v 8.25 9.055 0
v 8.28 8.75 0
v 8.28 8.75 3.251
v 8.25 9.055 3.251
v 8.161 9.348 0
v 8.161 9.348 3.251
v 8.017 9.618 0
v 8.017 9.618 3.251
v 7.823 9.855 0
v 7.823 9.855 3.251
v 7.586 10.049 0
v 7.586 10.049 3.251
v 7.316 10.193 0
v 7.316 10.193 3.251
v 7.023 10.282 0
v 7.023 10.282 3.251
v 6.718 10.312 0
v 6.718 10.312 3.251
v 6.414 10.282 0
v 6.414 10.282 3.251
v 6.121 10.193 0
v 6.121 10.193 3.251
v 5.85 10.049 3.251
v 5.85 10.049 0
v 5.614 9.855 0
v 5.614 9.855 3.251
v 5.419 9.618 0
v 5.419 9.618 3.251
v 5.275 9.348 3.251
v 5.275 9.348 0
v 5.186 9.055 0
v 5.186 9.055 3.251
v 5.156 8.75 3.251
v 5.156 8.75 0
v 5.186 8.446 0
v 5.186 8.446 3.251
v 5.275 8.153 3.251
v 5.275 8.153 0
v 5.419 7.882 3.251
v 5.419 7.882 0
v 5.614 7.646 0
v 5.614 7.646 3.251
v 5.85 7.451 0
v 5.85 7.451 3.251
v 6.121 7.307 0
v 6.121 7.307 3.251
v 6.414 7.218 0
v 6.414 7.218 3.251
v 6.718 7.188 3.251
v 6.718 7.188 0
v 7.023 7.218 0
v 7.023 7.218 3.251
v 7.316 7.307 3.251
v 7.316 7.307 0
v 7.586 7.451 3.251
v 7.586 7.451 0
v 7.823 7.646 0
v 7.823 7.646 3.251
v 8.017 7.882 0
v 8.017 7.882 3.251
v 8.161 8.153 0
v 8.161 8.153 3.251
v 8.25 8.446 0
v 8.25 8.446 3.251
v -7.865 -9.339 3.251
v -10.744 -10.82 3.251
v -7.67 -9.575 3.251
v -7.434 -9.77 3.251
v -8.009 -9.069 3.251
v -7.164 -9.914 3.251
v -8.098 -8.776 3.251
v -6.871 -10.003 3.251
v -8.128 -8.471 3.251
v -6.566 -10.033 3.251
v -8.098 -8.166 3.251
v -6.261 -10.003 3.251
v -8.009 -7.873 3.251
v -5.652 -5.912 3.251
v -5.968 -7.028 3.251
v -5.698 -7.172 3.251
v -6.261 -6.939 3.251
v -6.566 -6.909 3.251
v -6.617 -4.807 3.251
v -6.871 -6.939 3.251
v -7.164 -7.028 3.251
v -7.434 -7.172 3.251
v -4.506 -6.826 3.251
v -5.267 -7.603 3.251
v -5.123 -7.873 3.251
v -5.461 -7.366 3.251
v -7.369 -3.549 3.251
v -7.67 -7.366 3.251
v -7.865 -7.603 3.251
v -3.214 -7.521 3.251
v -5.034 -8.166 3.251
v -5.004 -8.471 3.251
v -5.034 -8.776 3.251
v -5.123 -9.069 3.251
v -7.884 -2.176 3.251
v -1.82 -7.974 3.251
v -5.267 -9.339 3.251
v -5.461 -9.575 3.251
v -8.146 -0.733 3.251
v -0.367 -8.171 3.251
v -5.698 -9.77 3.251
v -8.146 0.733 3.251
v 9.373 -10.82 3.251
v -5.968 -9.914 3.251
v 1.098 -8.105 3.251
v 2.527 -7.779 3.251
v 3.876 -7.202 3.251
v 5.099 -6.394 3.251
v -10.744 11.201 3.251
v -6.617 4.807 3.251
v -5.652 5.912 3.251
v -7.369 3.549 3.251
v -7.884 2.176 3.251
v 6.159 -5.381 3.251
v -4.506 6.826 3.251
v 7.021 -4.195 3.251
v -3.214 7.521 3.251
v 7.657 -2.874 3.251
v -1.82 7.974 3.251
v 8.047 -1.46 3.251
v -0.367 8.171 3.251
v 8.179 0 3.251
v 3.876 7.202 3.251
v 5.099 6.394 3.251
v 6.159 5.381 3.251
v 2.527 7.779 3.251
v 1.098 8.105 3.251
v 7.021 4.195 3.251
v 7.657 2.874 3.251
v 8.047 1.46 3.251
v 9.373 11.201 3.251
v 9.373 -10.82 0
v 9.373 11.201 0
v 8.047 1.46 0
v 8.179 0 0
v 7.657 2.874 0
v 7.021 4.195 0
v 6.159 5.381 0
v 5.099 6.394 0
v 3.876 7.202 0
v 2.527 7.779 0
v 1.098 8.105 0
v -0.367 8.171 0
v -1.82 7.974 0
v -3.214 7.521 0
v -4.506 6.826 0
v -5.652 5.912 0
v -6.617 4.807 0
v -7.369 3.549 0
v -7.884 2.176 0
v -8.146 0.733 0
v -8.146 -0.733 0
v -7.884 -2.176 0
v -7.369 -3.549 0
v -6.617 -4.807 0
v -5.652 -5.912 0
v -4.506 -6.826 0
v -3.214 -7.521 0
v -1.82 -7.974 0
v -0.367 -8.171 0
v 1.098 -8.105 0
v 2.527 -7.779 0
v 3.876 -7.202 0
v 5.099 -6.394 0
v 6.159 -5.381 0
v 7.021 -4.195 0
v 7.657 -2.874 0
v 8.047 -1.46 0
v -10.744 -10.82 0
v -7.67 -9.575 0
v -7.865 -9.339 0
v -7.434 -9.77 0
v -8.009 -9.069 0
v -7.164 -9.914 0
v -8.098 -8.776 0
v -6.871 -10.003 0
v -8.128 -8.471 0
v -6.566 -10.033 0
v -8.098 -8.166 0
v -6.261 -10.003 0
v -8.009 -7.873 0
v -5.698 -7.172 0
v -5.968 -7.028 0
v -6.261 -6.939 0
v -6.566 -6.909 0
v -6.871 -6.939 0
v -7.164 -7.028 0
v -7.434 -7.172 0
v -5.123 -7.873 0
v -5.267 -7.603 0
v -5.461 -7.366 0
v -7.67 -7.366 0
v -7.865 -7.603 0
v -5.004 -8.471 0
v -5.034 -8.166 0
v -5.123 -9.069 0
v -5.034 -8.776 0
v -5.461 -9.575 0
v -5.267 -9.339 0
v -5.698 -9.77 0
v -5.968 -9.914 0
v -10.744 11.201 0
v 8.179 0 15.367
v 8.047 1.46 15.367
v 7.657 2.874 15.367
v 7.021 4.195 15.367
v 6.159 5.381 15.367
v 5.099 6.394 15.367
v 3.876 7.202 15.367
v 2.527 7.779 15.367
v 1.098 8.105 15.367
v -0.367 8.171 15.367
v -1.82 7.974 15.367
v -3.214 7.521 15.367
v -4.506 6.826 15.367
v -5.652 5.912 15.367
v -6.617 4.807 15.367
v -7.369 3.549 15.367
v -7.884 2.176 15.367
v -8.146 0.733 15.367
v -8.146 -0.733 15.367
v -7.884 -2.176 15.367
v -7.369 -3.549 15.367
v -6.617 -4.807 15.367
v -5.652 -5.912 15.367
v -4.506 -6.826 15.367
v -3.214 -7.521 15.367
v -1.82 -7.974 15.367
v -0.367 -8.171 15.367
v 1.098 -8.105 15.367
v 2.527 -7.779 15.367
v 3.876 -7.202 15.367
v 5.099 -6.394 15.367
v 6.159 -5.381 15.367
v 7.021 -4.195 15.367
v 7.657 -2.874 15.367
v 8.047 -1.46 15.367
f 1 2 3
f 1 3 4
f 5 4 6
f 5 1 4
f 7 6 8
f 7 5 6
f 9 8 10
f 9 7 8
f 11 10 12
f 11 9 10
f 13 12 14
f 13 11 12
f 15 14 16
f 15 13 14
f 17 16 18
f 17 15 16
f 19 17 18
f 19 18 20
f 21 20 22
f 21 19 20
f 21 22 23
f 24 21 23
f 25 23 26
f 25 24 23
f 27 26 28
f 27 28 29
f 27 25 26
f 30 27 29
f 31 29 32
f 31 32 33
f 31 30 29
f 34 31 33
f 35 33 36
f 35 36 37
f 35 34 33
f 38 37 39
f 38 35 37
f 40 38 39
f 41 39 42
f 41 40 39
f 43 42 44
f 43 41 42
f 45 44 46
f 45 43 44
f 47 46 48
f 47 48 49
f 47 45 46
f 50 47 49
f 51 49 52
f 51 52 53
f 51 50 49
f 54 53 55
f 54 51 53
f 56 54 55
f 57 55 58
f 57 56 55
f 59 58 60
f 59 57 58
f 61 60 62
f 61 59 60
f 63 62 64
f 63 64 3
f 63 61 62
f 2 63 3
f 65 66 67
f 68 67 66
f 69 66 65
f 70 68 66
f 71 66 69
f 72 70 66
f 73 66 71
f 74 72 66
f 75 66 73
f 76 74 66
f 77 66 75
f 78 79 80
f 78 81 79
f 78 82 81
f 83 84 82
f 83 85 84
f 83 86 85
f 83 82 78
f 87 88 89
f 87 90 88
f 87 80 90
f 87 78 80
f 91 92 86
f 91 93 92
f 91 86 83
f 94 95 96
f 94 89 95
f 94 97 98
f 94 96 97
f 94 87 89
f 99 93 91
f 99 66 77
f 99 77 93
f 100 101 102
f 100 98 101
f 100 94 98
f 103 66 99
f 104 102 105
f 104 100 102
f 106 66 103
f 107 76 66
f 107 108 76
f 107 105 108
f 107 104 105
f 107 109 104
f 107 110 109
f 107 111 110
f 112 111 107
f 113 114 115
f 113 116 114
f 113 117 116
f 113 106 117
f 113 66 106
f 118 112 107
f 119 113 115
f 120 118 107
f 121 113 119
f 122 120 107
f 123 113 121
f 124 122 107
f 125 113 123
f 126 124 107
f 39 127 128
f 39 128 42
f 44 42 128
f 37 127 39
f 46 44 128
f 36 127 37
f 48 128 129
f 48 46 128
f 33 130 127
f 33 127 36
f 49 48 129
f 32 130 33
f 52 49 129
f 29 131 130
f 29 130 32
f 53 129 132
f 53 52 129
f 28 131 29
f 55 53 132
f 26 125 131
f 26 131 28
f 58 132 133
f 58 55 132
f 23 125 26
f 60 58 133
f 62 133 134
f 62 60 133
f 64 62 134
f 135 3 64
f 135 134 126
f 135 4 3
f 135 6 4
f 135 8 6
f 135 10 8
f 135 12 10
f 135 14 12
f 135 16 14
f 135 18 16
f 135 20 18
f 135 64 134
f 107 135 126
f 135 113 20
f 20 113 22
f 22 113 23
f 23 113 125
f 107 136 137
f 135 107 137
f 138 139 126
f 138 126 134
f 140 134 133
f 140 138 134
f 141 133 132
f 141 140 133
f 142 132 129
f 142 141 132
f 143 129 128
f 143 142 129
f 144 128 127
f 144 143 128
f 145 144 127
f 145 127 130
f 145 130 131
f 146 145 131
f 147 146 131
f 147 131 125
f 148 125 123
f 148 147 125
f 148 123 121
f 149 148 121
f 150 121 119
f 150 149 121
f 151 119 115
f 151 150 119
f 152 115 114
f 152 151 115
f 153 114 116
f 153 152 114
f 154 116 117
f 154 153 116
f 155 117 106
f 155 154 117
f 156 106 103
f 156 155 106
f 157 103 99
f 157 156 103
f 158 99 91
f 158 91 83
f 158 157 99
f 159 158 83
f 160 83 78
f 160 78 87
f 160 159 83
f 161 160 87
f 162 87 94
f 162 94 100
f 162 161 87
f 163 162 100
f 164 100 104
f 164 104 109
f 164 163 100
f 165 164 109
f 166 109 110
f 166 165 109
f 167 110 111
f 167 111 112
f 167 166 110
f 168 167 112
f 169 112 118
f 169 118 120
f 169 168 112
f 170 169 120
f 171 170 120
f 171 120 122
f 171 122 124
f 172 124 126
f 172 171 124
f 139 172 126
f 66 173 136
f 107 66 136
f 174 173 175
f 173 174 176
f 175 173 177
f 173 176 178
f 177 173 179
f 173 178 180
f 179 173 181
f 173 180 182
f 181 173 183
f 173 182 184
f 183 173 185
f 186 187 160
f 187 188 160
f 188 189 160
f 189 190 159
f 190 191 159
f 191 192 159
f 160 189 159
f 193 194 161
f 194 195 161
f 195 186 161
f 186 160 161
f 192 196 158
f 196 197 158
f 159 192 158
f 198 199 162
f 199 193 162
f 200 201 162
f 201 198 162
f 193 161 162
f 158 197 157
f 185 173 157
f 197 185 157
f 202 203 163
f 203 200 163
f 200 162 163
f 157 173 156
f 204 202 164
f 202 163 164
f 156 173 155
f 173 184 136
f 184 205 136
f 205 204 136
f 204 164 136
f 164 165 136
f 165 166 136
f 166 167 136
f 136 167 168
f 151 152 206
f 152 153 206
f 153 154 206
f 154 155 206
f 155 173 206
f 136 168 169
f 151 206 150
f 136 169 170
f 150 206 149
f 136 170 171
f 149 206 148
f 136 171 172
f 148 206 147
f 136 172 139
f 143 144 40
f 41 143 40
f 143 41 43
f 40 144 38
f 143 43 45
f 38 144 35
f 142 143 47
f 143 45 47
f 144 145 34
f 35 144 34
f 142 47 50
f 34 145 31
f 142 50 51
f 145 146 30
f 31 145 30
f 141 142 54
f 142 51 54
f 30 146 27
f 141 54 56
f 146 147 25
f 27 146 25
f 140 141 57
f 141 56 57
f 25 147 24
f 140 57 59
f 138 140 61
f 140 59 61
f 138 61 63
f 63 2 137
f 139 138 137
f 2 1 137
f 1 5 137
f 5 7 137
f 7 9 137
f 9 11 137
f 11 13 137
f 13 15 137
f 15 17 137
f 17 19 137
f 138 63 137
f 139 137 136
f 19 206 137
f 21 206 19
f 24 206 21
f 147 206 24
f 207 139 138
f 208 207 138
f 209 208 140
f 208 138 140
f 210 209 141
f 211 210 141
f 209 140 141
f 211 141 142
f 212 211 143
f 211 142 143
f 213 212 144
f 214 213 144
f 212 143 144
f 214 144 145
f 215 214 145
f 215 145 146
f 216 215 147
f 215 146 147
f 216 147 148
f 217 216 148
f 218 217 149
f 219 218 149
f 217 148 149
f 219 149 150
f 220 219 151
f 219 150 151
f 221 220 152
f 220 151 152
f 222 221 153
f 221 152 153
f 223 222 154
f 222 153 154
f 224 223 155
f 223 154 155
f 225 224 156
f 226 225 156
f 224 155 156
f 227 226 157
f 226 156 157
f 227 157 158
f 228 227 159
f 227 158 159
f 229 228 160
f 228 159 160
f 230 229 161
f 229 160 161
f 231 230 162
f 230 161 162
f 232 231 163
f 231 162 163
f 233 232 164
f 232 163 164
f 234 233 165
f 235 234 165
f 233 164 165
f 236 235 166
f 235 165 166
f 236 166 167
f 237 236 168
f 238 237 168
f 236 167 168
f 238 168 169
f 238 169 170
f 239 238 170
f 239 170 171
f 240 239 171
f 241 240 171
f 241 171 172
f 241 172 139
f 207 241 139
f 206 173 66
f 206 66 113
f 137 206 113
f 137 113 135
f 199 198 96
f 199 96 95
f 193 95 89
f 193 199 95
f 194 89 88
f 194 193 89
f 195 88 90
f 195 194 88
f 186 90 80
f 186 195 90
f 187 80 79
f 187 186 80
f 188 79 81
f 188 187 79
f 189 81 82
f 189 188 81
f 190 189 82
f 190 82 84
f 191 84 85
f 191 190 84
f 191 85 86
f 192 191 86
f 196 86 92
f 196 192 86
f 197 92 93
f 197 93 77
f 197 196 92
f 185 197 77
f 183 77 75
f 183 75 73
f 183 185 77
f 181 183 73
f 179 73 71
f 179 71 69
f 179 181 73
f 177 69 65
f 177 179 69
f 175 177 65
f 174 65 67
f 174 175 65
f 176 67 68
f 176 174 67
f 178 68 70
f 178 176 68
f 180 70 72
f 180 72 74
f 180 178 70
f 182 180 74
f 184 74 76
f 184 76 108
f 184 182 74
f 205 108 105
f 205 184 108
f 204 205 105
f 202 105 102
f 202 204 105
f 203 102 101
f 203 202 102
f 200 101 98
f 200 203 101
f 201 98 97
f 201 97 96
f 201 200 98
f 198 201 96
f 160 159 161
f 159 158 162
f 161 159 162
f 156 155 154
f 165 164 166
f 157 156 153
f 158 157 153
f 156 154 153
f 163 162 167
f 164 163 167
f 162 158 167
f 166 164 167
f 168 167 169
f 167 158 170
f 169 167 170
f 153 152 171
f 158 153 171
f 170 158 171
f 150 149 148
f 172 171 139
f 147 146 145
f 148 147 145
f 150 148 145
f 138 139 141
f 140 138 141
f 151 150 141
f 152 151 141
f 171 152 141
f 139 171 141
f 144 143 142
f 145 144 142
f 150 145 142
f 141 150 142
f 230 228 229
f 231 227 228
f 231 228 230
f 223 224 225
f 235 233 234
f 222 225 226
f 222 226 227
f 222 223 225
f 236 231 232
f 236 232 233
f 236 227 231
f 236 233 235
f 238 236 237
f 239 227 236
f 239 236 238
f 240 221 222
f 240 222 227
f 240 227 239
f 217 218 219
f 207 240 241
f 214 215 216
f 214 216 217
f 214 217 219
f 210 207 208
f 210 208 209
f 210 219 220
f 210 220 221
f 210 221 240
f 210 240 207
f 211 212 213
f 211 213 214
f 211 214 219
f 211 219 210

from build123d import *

# Parameters (mm, degrees)
F0_R     = 8.1788
F2_DEPTH = 15.367
F0_W     = 20.1168
F0_H     = 22.0218
F3_DEPTH = 3.2512
F1_R     = 1.5621
F4_DEPTH = 1.6256
F5_DEPTH = 3.2512
F6_DEPTH = 3.2512


with BuildPart() as f2:
    # F0 (on Top) → F2 (new body)
    with BuildSketch(Plane.XY):
        Circle(F0_R)
    extrude(amount=F2_DEPTH)

    # F1 (on Top) → F4 (cut)
    with BuildSketch(Plane.XY):
        with Locations((6.7183, 8.7503)):
            Circle(F1_R)
    extrude(amount=-F4_DEPTH, mode=Mode.SUBTRACT)


with BuildPart() as f3:
    # F0 (on Top) → F3 (new body)
    with BuildSketch(Plane.XY):
        with Locations((-0.6858, 0.1905)):
            Rectangle(F0_W, F0_H)
        Circle(F0_R, mode=Mode.SUBTRACT)
    extrude(amount=F3_DEPTH)

    # F1 (on Top) → F5 (cut)
    with BuildSketch(Plane.XY):
        with Locations((-6.5659, -8.4709)):
            Circle(F1_R)
    extrude(amount=F5_DEPTH, mode=Mode.SUBTRACT)

    # F1 (on Top) → F6 (cut)
    with BuildSketch(Plane.XY):
        with Locations((6.7183, 8.7503)):
            Circle(F1_R)
    extrude(amount=F6_DEPTH, mode=Mode.SUBTRACT)


solid = Compound([f2.part, f3.part])
